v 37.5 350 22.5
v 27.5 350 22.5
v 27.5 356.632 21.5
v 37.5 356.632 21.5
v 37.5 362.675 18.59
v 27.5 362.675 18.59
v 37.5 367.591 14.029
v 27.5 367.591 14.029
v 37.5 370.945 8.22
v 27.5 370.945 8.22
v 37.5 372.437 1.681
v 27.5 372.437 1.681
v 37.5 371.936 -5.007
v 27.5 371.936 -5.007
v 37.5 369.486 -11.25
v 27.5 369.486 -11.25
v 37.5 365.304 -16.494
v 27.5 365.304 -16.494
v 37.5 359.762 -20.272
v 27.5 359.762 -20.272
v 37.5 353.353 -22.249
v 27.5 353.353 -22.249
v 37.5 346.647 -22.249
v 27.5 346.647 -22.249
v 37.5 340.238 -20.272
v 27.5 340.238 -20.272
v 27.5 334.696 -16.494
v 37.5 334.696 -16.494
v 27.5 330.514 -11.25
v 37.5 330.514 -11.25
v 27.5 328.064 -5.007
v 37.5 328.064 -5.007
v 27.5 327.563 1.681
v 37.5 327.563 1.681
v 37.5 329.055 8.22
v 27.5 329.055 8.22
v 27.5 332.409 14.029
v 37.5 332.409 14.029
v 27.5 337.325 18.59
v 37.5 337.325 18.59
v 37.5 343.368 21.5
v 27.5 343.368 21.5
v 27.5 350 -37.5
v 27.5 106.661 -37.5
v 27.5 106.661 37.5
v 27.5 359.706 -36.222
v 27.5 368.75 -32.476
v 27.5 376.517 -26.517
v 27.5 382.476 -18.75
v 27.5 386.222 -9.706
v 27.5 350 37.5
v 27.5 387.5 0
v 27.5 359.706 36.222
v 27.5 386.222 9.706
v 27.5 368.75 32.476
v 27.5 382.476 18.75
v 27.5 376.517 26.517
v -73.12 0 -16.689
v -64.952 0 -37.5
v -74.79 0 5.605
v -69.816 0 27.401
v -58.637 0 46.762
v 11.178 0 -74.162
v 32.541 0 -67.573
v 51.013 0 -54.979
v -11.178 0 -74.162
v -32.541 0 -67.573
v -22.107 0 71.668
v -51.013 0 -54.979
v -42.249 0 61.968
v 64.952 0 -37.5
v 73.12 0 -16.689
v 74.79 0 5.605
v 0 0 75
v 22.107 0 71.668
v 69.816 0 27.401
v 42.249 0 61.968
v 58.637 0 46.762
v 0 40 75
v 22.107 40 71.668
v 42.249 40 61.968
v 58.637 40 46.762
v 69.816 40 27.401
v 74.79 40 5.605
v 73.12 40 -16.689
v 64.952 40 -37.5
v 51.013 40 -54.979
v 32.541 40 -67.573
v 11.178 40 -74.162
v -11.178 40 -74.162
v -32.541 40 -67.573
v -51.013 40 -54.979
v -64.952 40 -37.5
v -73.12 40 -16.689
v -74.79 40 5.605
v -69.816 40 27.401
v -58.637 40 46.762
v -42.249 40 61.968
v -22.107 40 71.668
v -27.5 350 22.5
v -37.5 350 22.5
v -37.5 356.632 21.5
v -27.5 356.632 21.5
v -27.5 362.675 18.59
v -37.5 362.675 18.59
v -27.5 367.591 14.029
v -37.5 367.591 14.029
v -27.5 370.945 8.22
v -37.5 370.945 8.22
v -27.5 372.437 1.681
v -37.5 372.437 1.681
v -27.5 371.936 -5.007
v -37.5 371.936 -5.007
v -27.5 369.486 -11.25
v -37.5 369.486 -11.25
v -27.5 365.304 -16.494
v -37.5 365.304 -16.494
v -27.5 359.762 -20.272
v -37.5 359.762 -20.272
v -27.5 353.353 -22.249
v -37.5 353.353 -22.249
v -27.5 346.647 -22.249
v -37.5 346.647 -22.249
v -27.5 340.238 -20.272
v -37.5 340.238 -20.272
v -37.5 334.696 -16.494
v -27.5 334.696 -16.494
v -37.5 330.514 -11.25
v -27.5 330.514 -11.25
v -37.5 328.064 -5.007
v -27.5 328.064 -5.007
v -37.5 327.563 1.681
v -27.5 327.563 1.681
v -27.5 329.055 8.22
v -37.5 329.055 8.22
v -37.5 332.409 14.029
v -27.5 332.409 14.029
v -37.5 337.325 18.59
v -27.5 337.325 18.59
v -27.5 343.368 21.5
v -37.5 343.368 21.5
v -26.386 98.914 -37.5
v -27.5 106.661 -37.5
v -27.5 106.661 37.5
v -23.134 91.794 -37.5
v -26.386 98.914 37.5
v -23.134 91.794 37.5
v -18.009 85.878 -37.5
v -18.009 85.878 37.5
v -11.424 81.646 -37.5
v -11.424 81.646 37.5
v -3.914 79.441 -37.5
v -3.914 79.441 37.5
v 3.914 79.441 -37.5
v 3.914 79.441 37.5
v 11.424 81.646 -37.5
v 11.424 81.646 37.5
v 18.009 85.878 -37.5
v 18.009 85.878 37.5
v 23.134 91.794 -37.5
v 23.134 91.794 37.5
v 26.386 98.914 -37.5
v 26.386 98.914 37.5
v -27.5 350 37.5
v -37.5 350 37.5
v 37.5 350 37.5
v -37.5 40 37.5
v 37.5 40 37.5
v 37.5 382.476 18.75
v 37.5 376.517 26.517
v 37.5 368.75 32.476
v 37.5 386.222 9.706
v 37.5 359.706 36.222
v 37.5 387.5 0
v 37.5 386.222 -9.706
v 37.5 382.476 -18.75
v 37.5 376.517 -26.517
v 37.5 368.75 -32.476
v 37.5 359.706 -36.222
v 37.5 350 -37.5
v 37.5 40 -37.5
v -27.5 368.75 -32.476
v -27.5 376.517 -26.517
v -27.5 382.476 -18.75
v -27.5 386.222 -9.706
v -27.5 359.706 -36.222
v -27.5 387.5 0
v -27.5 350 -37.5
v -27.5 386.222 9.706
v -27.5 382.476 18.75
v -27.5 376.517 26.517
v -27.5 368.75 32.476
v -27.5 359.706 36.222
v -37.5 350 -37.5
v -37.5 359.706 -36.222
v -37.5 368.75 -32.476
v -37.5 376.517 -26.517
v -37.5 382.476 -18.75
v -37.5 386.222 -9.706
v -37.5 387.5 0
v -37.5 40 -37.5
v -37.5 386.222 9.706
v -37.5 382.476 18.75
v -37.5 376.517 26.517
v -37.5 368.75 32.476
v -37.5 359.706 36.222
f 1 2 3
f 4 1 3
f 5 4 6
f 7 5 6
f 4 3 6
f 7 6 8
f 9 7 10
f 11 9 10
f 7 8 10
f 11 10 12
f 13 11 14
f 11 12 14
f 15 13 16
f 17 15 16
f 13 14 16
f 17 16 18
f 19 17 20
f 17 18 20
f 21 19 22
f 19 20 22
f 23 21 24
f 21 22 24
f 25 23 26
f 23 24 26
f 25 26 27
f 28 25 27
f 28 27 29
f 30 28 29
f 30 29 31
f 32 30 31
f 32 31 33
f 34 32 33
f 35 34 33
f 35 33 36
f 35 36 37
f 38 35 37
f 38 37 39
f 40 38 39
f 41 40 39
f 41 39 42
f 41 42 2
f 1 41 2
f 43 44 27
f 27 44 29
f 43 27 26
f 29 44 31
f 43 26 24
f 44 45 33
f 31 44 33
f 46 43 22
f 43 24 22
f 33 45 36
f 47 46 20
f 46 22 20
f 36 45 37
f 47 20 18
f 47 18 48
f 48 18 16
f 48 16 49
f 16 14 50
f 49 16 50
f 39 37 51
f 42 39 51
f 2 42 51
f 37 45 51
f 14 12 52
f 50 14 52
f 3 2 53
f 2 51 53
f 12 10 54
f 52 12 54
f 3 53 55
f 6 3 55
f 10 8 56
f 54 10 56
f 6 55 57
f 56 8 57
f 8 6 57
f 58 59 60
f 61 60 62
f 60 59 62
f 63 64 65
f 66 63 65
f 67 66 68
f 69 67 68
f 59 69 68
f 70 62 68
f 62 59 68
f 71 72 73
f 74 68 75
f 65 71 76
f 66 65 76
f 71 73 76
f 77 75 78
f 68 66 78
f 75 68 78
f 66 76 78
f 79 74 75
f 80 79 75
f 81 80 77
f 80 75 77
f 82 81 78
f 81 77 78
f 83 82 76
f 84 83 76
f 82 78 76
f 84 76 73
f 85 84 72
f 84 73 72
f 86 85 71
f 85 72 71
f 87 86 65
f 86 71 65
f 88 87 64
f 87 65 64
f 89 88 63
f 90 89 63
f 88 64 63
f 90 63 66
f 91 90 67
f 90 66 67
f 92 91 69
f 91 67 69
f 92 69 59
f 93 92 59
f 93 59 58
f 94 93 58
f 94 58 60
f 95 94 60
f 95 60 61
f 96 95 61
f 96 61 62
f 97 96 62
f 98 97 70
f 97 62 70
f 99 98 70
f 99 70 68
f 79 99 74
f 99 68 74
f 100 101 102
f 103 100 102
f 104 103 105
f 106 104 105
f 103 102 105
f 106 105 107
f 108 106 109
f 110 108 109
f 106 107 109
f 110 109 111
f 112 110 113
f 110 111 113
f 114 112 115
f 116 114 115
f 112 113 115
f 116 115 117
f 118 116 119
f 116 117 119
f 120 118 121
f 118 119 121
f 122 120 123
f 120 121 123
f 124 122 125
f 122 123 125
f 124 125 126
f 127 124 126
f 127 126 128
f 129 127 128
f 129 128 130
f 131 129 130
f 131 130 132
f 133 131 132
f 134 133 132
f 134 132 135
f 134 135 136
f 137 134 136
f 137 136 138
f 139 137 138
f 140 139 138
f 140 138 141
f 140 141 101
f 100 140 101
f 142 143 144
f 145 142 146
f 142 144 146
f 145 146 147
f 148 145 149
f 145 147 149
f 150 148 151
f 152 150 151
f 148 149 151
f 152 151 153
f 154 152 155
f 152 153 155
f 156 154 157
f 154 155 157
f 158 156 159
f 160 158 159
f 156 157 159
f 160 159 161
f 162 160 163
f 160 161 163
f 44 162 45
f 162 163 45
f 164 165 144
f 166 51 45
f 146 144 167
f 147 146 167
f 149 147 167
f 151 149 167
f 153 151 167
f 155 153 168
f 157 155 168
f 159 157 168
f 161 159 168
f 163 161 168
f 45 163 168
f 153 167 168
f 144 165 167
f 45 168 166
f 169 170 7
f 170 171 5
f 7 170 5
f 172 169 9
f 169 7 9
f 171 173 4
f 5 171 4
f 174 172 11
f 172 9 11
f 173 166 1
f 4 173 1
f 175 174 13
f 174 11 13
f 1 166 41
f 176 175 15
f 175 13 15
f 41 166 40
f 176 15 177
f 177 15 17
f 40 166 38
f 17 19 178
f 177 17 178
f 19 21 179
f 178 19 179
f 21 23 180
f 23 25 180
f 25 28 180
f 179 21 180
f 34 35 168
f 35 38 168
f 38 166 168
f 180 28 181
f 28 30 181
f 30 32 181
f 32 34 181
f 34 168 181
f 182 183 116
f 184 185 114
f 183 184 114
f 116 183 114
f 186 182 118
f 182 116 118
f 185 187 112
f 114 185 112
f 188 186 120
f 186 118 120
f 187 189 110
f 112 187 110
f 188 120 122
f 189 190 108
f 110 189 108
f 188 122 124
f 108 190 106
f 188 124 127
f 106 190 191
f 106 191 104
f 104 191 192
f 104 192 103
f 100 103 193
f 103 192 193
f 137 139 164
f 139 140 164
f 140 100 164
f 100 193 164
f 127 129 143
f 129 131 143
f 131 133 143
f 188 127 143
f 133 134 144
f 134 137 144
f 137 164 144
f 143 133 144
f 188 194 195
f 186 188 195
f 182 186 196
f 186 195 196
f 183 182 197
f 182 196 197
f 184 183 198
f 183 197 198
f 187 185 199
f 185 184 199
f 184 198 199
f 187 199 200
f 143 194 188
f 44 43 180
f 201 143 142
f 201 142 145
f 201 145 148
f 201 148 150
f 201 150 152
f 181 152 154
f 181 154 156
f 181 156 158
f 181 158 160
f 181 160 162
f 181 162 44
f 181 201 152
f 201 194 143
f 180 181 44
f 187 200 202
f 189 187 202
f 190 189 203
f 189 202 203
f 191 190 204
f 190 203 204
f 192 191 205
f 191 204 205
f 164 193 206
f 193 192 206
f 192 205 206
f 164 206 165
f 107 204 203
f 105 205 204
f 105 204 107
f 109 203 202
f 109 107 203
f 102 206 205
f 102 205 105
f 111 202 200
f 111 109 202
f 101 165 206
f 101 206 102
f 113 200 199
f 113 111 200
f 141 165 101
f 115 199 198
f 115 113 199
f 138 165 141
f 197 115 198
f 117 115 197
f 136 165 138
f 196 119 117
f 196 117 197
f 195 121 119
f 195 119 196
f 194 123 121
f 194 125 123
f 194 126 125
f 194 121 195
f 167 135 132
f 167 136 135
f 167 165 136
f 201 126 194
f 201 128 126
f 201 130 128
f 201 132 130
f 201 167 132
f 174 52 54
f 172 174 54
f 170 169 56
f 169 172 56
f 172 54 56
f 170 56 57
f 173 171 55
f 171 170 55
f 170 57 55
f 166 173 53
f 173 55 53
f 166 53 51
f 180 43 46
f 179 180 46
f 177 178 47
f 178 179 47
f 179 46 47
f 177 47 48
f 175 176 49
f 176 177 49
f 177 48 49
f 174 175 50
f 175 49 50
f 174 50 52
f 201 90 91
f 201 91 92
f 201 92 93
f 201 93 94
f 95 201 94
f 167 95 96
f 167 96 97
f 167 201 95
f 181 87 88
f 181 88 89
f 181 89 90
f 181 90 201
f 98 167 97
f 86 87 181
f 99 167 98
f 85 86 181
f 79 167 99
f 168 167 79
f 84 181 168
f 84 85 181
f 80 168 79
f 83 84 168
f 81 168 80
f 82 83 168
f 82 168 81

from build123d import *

# Parameters (mm, degrees)
SKETCH1_R           = 75
BOSS_EXTRUDE1_DEPTH = 40
SKETCH3_W           = 75
SKETCH3_H           = 75
BOSS_EXTRUDE2_DEPTH = 347.5
CUT_EXTRUDE1_DEPTH  = 80
SKETCH4_R           = 22.5
CUT_EXTRUDE2_DEPTH  = 80
CUT_EXTRUDE3_DEPTH  = 80


with BuildPart() as part:
    # Sketch1 → Boss-Extrude1 (new body)
    with BuildSketch(Plane(origin=(0, 0, 0), x_dir=(1, 0, 0), z_dir=(0, 1, 0))):
        with Locations(Location((0, 0, 0), (0, 0, 270))):
            Circle(SKETCH1_R)
    extrude(amount=BOSS_EXTRUDE1_DEPTH)

    # Sketch3 → Boss-Extrude2 (add)
    with BuildSketch(Plane(origin=(0, 40, 0), x_dir=(1, 0, 0), z_dir=(0, 1, 0))):
        Rectangle(SKETCH3_W, SKETCH3_H)
    extrude(amount=BOSS_EXTRUDE2_DEPTH)

    # Sketch5 → Cut-Extrude1 (cut)
    with BuildSketch(Plane.ZY.offset(37.5)):
        with BuildLine():
            Line((37.5, 387.5), (0, 387.5))
            ThreePointArc((0, 387.5), (26.516504294, 376.516504294), (37.5, 350))
            Line((37.5, 350), (37.5, 387.5))
        make_face()
        with BuildLine():
            Line((-37.5, 387.5), (-37.5, 350))
            ThreePointArc((-37.5, 350), (-26.516504294, 376.516504294), (0, 387.5))
            Line((0, 387.5), (-37.5, 387.5))
        make_face()
    extrude(amount=-CUT_EXTRUDE1_DEPTH, mode=Mode.SUBTRACT)

    # Sketch4 → Cut-Extrude2 (cut)
    with BuildSketch(Plane.ZY.offset(37.5)):
        with Locations((0, 350)):
            Circle(SKETCH4_R)
    extrude(amount=-CUT_EXTRUDE2_DEPTH, mode=Mode.SUBTRACT)

    # Sketch6 → Cut-Extrude3 (cut)
    with BuildSketch(Plane.XY.offset(37.5)):
        with BuildLine():
            Line((27.5, 401.577624338), (-27.5, 401.577624338))
            Line((-27.5, 401.577624338), (-27.5, 106.661183131))
            ThreePointArc((-27.5, 106.661183131), (0, 79.161183131), (27.5, 106.661183131))
            Line((27.5, 106.661183131), (27.5, 401.577624338))
        make_face()
    extrude(amount=-CUT_EXTRUDE3_DEPTH, mode=Mode.SUBTRACT)


solid = part.part
